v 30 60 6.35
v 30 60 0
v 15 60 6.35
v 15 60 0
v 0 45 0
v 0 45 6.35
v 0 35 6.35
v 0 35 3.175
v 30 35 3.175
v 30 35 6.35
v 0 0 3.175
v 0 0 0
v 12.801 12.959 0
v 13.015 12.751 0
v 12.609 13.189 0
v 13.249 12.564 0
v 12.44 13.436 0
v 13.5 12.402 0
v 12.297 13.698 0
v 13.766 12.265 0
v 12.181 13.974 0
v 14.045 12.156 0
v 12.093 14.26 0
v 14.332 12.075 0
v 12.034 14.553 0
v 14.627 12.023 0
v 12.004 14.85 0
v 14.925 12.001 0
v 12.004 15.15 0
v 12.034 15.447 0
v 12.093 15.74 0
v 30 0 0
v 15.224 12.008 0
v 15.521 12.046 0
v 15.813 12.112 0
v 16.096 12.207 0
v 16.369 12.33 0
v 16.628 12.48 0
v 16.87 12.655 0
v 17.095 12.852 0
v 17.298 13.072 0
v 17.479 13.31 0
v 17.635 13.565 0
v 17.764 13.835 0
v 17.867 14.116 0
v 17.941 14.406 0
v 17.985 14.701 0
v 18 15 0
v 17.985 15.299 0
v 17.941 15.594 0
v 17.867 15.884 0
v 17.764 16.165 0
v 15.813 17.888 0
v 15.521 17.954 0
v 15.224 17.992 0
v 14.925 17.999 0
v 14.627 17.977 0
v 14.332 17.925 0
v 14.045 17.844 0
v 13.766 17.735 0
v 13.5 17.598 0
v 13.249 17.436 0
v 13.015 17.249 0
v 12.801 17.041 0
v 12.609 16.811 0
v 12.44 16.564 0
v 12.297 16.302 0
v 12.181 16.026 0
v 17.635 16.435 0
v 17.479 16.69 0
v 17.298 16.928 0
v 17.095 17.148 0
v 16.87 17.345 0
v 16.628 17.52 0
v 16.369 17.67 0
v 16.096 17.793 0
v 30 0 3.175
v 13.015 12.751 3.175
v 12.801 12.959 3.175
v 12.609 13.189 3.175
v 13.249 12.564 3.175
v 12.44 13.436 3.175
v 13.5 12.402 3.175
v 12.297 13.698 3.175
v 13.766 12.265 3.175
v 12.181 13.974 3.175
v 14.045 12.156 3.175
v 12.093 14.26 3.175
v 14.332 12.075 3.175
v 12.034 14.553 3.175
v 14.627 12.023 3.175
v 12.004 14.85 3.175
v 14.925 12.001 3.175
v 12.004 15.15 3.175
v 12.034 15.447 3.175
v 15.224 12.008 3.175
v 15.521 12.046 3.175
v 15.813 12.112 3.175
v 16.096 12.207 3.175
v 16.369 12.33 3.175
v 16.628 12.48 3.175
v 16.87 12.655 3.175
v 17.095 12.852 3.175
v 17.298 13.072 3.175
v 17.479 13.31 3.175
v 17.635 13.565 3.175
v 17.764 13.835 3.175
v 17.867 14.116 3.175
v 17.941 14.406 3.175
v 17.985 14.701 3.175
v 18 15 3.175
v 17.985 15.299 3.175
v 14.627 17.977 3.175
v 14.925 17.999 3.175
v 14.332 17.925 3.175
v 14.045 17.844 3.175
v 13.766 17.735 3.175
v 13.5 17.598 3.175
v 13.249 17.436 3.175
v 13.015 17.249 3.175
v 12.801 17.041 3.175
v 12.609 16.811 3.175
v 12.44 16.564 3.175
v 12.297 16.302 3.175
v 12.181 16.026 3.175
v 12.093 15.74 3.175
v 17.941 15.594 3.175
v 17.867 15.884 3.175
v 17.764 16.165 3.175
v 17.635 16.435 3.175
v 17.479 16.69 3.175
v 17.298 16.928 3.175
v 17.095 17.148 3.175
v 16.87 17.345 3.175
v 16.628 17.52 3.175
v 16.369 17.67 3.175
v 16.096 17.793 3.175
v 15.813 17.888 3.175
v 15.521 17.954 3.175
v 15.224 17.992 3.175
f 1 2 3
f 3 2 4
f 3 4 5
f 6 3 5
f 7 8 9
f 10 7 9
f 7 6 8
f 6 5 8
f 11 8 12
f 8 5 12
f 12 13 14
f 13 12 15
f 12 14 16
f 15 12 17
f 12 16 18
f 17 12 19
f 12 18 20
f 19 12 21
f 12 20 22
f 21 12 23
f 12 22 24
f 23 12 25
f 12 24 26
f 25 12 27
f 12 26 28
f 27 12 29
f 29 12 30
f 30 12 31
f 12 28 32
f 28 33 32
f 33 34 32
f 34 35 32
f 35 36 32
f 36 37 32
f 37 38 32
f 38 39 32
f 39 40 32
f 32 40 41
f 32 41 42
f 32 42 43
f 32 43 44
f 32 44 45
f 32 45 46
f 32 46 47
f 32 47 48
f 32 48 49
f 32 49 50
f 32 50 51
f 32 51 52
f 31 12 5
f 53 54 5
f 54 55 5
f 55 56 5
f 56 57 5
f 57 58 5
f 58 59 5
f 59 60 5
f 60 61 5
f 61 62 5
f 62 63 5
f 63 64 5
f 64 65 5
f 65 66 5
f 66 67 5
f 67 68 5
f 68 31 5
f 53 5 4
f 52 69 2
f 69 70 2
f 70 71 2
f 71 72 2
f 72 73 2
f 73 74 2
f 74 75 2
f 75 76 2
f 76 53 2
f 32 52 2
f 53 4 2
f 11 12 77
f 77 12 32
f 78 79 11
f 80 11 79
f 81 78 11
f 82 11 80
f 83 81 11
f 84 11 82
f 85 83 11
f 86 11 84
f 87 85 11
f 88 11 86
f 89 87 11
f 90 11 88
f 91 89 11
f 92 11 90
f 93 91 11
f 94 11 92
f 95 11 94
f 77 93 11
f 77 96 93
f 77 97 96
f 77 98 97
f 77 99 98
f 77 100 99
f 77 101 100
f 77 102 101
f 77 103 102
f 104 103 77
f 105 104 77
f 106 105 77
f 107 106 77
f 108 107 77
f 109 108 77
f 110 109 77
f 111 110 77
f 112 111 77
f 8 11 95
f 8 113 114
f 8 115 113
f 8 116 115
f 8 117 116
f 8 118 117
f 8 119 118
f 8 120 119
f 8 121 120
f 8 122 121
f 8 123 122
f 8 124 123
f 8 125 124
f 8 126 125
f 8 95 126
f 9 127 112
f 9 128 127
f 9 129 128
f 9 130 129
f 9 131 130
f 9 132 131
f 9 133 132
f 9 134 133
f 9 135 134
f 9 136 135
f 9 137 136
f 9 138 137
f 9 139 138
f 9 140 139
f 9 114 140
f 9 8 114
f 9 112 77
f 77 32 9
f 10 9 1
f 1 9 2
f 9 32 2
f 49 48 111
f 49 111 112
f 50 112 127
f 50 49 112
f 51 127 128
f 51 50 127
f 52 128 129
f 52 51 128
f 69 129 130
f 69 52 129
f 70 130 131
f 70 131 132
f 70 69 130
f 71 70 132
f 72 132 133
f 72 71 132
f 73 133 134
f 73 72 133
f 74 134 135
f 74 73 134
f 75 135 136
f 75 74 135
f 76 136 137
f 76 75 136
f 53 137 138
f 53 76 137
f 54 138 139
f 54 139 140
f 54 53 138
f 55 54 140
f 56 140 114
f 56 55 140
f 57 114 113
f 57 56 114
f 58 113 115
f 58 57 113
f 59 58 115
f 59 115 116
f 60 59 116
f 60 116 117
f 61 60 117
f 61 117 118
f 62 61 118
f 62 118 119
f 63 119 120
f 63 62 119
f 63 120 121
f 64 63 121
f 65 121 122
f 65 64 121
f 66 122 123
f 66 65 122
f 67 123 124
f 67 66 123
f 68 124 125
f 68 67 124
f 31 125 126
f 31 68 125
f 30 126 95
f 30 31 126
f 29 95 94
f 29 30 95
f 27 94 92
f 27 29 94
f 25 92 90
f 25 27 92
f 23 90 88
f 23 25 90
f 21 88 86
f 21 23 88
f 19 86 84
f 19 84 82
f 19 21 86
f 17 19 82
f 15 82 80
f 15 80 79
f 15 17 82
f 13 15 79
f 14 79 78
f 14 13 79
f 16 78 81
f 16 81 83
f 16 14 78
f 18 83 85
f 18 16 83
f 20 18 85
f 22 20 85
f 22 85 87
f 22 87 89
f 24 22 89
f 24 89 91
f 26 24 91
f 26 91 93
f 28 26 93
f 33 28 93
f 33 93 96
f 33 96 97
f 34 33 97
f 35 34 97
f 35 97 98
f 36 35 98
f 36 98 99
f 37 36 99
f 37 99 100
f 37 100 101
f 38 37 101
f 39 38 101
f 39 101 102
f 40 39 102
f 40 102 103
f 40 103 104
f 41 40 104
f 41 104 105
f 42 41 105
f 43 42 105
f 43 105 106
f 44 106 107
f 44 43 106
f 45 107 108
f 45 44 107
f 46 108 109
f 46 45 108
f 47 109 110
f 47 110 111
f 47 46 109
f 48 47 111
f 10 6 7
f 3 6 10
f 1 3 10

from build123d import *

# Parameters (mm, degrees)
SKETCH1_R           = 3
BOSS_EXTRUDE1_DEPTH = 3.175
BOSS_EXTRUDE2_DEPTH = 3.175


with BuildPart() as part:
    # Sketch1 → Boss-Extrude1 (new body)
    with BuildSketch(Plane.XY):
        Polygon((15, 60), (0, 45), (0, 0), (30, 0), (30, 60), align=None)
        with Locations((15, 15)):
            Circle(SKETCH1_R, mode=Mode.SUBTRACT)
    extrude(amount=BOSS_EXTRUDE1_DEPTH)

    # Sketch2 → Boss-Extrude2 (add)
    with BuildSketch(Plane.XY.offset(3.175)):
        Polygon((15, 60), (0, 45), (0, 35), (30, 35), (30, 45), (30, 60), align=None)
    extrude(amount=BOSS_EXTRUDE2_DEPTH)


solid = part.part
